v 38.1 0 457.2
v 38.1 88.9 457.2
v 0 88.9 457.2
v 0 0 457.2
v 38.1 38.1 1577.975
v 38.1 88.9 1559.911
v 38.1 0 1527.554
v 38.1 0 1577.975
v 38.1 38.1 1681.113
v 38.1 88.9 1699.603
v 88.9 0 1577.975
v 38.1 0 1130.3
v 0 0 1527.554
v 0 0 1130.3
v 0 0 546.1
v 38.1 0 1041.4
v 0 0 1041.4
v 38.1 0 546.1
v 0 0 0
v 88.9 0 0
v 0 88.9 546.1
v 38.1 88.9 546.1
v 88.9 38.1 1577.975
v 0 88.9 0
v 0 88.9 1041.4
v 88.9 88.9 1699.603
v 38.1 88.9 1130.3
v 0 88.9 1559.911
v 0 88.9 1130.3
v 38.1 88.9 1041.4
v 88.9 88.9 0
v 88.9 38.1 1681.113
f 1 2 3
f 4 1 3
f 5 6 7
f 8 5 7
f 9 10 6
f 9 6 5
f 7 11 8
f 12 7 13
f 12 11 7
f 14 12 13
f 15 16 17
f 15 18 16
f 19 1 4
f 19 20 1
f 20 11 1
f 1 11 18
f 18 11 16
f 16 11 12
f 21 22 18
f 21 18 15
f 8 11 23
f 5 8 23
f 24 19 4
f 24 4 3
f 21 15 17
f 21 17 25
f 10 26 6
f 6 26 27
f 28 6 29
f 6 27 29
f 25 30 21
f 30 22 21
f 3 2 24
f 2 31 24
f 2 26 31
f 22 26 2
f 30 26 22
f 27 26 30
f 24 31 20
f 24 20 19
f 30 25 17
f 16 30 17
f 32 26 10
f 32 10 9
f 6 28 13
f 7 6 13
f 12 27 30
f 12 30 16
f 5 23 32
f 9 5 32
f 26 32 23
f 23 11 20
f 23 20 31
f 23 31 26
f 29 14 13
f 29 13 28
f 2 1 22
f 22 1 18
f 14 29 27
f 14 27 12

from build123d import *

# Parameters (mm, degrees)
BOX002_W        = 88.9
BOX002_H        = 88.9
BOX002_DEPTH    = 2438.4
SKETCH_W        = 38.1
SKETCH_H        = 88.9
POCKET_DEPTH    = 88.9010000032
POCKET006_DEPTH = 88.901
POCKET012_DEPTH = 38.1
SKETCH017_W     = 38.1
SKETCH017_H     = 111.76
POCKET014_DEPTH = 88.901
SKETCH034_W     = 88.9
SKETCH034_H     = 88.9
POCKET024_DEPTH = 38.1


with BuildPart() as swpost2:
    # Box002 → Box002 (new body)
    with BuildSketch(Plane(origin=(1435.1, 0, 0), x_dir=(1, 0, 0), z_dir=(0, 0, 1))):
        with Locations((44.45, 44.45)):
            Rectangle(BOX002_W, BOX002_H)
    extrude(amount=BOX002_DEPTH)

    # Sketch → Pocket (cut, through all)
    with BuildSketch(Plane(origin=(1435.1, 0, 0), x_dir=(1, 0, 0), z_dir=(0, -1, 0))):
        with Locations((69.85, 501.65)):
            Rectangle(SKETCH_W, SKETCH_H)
    extrude(amount=-POCKET_DEPTH, mode=Mode.SUBTRACT)


with BuildPart() as pocket024:
    # Part__Mirroring001: instance of SWpost2
    add(swpost2.part.mirror(Plane(origin=(762, 0, 0), x_dir=(0, -1, 0), z_dir=(1, 0, 0))))

    # Sketch007 → Pocket006 (cut, through all)
    with BuildSketch(Plane.YZ.offset(88.9)):
        Polygon((0, 1667.24584), (0, 2438.4), (88.9, 2438.4), (88.9, 1699.6027938263), align=None)
    extrude(amount=-POCKET006_DEPTH, mode=Mode.SUBTRACT)

    # Sketch013 → Pocket012 (cut)
    with BuildSketch(Plane(origin=(0, 0, 0), x_dir=(0, -1, 0), z_dir=(-1, 0, 0))):
        Polygon((-88.9, 1699.6109218263), (-88.9, 1559.9109218263), (0, 1527.553968), (0, 1667.253968), align=None)
    extrude(amount=-POCKET012_DEPTH, mode=Mode.SUBTRACT)

    # Sketch017 → Pocket014 (cut, through all)
    with BuildSketch(Plane.YZ.offset(88.9)):
        with Locations((19.05, 1633.855)):
            Rectangle(SKETCH017_W, SKETCH017_H)
    extrude(amount=-POCKET014_DEPTH, mode=Mode.SUBTRACT)

    # Sketch034 → Pocket024 (cut)
    with BuildSketch(Plane(origin=(0, 0, 0), x_dir=(0, -1, 0), z_dir=(-1, 0, 0))):
        with Locations((-44.45, 1085.85)):
            Rectangle(SKETCH034_W, SKETCH034_H)
    extrude(amount=-POCKET024_DEPTH, mode=Mode.SUBTRACT)


solid = pocket024.part
